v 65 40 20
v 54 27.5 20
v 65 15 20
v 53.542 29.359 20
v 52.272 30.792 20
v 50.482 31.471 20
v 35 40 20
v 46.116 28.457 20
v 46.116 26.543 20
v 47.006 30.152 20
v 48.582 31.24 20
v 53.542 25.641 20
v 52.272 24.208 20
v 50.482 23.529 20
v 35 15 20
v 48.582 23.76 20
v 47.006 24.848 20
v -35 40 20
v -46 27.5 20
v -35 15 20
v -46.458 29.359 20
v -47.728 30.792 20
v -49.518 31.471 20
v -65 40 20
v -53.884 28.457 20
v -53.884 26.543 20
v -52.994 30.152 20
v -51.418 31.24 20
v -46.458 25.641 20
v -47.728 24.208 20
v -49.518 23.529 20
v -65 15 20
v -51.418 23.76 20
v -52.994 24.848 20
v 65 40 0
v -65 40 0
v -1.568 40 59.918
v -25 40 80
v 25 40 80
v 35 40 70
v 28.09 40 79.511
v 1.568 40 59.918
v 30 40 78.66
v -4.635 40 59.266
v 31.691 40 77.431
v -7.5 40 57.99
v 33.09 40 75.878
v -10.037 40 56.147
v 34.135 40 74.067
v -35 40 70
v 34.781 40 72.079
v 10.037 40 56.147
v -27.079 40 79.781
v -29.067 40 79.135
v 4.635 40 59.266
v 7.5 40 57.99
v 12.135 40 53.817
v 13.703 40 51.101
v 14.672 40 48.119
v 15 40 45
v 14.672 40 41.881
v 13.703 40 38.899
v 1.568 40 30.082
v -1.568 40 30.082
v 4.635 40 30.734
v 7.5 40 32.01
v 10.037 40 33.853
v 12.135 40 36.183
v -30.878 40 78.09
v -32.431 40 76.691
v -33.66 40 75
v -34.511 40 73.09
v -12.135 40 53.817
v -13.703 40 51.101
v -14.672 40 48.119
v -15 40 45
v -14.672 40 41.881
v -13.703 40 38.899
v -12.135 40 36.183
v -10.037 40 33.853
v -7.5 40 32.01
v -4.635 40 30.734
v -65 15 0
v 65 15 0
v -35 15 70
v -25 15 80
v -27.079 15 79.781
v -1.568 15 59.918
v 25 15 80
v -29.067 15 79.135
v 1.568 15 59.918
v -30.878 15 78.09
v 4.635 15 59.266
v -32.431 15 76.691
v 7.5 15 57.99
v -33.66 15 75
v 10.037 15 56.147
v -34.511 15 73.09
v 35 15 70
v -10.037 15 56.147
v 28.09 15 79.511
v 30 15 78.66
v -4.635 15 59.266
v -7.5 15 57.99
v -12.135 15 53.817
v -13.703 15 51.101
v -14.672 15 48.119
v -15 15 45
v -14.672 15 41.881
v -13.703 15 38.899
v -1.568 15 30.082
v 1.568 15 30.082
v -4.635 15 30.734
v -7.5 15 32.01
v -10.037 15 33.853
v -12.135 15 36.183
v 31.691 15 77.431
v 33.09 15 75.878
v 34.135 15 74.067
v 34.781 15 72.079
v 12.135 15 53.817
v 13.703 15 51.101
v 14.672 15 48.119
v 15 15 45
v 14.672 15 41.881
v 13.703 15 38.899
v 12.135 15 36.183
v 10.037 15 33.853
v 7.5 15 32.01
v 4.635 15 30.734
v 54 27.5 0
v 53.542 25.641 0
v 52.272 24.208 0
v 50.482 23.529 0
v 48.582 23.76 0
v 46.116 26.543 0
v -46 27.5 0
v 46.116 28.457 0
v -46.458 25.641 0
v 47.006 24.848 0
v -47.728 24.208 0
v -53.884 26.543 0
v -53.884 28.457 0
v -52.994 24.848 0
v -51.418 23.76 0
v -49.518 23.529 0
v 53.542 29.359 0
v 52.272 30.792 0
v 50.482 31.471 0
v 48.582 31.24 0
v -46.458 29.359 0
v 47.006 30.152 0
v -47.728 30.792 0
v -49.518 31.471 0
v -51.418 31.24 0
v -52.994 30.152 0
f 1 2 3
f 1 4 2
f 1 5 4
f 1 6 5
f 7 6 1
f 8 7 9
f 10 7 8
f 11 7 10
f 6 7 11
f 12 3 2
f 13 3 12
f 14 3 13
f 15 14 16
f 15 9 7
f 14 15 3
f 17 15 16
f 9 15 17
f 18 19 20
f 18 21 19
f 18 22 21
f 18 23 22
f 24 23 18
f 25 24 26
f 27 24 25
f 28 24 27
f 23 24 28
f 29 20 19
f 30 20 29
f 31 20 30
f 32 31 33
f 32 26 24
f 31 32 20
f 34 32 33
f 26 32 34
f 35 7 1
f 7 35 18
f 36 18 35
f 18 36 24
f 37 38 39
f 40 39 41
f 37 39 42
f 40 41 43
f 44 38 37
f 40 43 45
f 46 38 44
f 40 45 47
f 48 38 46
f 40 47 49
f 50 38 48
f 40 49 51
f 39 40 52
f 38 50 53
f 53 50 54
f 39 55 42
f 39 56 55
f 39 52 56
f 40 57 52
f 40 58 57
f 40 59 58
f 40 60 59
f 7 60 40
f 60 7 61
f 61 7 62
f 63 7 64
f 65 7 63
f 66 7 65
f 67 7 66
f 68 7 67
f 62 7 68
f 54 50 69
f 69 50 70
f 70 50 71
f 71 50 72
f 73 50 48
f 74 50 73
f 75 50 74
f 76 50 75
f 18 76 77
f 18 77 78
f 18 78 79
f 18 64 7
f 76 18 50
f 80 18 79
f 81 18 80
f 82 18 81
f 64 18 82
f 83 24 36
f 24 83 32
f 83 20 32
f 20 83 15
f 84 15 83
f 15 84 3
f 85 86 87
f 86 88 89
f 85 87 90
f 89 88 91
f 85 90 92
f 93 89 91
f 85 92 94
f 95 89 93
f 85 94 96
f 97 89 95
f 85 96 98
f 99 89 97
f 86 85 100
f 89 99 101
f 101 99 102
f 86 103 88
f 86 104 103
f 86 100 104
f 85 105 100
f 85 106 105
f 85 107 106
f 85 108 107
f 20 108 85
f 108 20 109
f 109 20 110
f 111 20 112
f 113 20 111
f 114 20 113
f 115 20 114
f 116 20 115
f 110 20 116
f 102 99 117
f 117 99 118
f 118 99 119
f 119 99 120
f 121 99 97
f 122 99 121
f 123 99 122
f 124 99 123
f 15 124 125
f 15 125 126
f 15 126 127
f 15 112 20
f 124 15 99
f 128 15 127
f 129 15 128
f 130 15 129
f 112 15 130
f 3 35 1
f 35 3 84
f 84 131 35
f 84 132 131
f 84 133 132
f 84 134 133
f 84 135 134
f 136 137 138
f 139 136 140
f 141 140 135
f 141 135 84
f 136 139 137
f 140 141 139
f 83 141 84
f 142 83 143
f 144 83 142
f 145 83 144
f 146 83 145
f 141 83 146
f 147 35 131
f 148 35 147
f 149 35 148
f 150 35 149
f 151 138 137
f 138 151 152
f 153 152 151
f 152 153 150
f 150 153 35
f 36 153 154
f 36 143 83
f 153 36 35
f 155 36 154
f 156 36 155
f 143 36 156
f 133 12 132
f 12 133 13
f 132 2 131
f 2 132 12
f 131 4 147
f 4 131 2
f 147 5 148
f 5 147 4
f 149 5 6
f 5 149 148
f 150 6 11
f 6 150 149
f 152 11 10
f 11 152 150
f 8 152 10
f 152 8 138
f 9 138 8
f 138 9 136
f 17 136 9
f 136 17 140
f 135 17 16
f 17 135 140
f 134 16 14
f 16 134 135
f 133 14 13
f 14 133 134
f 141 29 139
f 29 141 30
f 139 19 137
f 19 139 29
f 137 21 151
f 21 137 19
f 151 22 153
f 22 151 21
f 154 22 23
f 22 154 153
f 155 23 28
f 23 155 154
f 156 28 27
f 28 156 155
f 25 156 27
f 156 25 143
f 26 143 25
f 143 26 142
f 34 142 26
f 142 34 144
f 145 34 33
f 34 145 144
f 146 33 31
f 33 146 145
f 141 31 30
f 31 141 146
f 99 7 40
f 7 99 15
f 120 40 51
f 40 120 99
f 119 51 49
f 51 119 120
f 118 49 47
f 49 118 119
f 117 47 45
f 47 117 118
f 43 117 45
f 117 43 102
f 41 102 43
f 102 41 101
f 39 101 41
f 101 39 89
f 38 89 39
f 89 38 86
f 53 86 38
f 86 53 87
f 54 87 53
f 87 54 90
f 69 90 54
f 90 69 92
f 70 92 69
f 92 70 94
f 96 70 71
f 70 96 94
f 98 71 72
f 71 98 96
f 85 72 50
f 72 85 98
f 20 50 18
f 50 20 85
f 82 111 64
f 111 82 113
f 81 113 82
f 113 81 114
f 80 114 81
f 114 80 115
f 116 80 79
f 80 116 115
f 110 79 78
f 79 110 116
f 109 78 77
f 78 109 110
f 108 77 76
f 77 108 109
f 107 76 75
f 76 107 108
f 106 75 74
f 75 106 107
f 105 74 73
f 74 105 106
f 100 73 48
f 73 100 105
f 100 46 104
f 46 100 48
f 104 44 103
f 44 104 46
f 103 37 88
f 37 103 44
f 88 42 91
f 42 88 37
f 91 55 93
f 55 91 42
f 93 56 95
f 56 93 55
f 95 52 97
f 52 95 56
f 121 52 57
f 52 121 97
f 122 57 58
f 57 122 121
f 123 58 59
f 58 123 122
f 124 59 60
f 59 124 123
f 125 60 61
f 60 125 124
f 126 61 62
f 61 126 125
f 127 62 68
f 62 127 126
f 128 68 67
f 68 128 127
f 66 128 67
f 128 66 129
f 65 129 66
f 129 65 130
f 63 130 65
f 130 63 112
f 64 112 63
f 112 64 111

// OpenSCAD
bearing_dia = 15;
width = 25;

translate([0, 40, 0]){
    union(){
        translate([0, 0, 45]){
            rotate([90, 0, 0]){
                linear_extrude(height = width, scale = 1){
                    difference(){
                        offset(10) square(50, center = true);
                        circle(bearing_dia);
                    }
                }
            }
        }
        difference(){
            translate([0, 0, 10]){
                rotate([90, 0, 0]){
                    linear_extrude(height = width, scale = 1){
                        square([130, 20], center = true);
                    }
                }
            }
            translate([0, 0, -2]){
                #linear_extrude(height = 25){
                    translate([50, -(width/2), 0]) circle(4);
                    translate([-50, -(width/2), 0]) circle(4);
                }
            }
        }
    }
}

difference(){
    square([130, 20], center = true);
    translate([50, 0, 0]) circle(4);
    translate([-50, 0, 0]) circle(4);
}
